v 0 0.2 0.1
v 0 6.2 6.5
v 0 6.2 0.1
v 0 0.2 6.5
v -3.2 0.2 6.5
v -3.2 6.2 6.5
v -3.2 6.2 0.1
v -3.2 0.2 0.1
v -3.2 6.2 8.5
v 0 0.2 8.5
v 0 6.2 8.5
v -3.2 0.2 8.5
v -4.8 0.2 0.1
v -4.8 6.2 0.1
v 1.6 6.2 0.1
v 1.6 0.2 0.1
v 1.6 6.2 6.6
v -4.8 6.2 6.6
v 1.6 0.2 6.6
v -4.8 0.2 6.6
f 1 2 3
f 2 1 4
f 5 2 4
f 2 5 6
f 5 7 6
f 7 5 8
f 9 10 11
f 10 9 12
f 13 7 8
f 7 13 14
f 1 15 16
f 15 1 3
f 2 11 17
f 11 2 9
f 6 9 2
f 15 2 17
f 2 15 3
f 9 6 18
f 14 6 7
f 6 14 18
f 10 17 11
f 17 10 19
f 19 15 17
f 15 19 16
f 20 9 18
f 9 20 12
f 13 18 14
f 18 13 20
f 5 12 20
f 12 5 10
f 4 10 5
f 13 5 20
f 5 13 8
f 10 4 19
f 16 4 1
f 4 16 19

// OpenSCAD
module rail_end() {
   cube([3.2,12,6.5]); //rail
}

module pin() {
  rotate([0,90,0])
  cylinder(d=2, h=7, $fn=24);
}

module chassis() {
translate([39,0,0]) //left_rail
  rail_end(); 
translate([-3.2,0,0]) //right_rail
  rail_end(); 
}



difference() {
hull() {
translate([-4.8,.2,0.1])
    cube([6.4,6,6.5]);

translate([-3.2,.2,6.5])
    cube([3.2,6,2]);
}

chassis();
}
